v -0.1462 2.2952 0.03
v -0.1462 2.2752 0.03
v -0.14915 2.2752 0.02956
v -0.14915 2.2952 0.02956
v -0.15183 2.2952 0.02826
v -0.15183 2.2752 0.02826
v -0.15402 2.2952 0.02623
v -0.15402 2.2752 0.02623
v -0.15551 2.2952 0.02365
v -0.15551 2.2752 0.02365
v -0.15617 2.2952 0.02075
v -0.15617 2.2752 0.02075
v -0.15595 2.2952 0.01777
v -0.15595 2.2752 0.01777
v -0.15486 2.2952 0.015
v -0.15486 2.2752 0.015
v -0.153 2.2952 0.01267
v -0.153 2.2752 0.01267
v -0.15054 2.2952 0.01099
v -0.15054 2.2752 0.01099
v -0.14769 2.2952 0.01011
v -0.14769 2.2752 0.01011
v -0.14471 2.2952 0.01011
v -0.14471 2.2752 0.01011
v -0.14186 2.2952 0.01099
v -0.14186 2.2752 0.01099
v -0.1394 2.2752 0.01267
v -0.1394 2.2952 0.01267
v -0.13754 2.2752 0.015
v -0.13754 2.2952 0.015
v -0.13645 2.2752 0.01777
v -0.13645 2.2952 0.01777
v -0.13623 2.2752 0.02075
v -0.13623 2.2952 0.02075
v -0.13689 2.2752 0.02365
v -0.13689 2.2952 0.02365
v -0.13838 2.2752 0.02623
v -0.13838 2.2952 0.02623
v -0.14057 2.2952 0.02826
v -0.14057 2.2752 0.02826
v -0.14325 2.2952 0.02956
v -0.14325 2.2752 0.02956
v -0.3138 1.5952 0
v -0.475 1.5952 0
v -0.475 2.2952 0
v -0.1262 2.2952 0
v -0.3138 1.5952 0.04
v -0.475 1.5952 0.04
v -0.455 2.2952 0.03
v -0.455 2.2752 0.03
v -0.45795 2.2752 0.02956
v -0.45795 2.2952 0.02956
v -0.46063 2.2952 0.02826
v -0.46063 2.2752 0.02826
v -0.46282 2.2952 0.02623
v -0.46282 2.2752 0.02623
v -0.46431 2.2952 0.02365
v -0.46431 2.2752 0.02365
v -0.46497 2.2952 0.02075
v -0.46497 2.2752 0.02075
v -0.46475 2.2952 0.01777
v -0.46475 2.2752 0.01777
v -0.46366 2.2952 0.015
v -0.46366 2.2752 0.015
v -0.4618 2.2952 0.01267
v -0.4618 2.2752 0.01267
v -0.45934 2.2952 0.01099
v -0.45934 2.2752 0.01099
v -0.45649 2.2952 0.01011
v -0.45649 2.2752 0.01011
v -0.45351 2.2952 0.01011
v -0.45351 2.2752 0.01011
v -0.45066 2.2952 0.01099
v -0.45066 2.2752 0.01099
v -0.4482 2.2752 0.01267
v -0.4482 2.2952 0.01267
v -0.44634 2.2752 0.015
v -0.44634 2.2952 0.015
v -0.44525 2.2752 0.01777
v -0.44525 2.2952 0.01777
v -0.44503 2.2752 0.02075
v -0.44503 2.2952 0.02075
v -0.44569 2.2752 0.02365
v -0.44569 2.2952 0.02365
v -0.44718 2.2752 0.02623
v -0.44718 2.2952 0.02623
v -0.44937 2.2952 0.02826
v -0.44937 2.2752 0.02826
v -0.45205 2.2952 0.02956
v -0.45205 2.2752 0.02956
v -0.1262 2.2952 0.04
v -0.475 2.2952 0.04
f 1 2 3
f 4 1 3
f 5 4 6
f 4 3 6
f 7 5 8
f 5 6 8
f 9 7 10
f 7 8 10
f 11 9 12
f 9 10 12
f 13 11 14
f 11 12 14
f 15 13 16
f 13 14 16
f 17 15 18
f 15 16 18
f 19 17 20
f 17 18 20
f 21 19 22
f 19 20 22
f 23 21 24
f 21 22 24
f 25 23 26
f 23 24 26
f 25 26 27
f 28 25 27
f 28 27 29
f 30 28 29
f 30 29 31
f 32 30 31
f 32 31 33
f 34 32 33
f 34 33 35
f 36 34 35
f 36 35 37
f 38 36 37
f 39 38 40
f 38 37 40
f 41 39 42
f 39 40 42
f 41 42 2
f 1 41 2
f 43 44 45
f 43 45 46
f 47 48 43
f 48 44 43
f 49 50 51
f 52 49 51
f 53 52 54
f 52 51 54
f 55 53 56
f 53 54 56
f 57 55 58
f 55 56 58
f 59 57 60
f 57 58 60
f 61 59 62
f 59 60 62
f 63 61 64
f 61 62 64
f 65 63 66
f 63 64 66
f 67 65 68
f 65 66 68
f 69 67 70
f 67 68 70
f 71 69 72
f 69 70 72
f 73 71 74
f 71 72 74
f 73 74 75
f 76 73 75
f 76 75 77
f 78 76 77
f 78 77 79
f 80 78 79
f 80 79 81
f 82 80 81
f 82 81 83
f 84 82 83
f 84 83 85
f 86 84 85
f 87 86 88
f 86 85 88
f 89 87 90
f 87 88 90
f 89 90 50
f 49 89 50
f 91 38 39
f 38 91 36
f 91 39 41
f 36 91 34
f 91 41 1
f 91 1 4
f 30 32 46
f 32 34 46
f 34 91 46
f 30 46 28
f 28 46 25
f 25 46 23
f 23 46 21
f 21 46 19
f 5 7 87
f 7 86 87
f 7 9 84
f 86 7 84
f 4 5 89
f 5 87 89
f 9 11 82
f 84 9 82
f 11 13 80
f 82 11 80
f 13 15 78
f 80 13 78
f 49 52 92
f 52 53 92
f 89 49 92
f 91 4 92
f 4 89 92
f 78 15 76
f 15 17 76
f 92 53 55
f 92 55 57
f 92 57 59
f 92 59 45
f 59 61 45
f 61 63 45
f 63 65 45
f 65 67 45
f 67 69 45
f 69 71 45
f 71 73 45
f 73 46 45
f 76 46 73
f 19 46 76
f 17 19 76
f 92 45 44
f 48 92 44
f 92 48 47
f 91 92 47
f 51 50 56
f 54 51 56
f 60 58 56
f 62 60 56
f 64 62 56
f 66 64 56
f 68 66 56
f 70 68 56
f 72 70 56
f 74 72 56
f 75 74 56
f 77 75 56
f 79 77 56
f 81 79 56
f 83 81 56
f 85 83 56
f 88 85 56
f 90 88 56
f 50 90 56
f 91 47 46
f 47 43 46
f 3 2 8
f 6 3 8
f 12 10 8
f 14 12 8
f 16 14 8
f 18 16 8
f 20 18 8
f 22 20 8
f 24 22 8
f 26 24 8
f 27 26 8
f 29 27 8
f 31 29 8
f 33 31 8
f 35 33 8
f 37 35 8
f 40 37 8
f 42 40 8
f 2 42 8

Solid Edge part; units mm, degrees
sketch "Sketch1" plane through (0, 0, 0) normal (0, 0, 1) x (1, 0, 0)
  line L0 (-0.3138, 1.5952) -> (-0.1262, 2.2952)
  line L1 (-0.1262, 2.2952) -> (-0.475, 2.2952)
  line L2 (-0.475, 2.2952) -> (-0.475, 1.5952)
  line L3 (-0.475, 1.5952) -> (-0.3138, 1.5952)
extrude "Protrusion1" add sketch "Sketch1" along normal blind 0.04
hole "Bohrung_15" at (-0.455, 2.2952, 0.02) direction (0, -1, 0) diameter 0.02 depth 0.02
hole "Hole1" at (-0.1462, 2.2952, 0.02) direction (0, -1, 0) diameter 0.02 depth 0.02
